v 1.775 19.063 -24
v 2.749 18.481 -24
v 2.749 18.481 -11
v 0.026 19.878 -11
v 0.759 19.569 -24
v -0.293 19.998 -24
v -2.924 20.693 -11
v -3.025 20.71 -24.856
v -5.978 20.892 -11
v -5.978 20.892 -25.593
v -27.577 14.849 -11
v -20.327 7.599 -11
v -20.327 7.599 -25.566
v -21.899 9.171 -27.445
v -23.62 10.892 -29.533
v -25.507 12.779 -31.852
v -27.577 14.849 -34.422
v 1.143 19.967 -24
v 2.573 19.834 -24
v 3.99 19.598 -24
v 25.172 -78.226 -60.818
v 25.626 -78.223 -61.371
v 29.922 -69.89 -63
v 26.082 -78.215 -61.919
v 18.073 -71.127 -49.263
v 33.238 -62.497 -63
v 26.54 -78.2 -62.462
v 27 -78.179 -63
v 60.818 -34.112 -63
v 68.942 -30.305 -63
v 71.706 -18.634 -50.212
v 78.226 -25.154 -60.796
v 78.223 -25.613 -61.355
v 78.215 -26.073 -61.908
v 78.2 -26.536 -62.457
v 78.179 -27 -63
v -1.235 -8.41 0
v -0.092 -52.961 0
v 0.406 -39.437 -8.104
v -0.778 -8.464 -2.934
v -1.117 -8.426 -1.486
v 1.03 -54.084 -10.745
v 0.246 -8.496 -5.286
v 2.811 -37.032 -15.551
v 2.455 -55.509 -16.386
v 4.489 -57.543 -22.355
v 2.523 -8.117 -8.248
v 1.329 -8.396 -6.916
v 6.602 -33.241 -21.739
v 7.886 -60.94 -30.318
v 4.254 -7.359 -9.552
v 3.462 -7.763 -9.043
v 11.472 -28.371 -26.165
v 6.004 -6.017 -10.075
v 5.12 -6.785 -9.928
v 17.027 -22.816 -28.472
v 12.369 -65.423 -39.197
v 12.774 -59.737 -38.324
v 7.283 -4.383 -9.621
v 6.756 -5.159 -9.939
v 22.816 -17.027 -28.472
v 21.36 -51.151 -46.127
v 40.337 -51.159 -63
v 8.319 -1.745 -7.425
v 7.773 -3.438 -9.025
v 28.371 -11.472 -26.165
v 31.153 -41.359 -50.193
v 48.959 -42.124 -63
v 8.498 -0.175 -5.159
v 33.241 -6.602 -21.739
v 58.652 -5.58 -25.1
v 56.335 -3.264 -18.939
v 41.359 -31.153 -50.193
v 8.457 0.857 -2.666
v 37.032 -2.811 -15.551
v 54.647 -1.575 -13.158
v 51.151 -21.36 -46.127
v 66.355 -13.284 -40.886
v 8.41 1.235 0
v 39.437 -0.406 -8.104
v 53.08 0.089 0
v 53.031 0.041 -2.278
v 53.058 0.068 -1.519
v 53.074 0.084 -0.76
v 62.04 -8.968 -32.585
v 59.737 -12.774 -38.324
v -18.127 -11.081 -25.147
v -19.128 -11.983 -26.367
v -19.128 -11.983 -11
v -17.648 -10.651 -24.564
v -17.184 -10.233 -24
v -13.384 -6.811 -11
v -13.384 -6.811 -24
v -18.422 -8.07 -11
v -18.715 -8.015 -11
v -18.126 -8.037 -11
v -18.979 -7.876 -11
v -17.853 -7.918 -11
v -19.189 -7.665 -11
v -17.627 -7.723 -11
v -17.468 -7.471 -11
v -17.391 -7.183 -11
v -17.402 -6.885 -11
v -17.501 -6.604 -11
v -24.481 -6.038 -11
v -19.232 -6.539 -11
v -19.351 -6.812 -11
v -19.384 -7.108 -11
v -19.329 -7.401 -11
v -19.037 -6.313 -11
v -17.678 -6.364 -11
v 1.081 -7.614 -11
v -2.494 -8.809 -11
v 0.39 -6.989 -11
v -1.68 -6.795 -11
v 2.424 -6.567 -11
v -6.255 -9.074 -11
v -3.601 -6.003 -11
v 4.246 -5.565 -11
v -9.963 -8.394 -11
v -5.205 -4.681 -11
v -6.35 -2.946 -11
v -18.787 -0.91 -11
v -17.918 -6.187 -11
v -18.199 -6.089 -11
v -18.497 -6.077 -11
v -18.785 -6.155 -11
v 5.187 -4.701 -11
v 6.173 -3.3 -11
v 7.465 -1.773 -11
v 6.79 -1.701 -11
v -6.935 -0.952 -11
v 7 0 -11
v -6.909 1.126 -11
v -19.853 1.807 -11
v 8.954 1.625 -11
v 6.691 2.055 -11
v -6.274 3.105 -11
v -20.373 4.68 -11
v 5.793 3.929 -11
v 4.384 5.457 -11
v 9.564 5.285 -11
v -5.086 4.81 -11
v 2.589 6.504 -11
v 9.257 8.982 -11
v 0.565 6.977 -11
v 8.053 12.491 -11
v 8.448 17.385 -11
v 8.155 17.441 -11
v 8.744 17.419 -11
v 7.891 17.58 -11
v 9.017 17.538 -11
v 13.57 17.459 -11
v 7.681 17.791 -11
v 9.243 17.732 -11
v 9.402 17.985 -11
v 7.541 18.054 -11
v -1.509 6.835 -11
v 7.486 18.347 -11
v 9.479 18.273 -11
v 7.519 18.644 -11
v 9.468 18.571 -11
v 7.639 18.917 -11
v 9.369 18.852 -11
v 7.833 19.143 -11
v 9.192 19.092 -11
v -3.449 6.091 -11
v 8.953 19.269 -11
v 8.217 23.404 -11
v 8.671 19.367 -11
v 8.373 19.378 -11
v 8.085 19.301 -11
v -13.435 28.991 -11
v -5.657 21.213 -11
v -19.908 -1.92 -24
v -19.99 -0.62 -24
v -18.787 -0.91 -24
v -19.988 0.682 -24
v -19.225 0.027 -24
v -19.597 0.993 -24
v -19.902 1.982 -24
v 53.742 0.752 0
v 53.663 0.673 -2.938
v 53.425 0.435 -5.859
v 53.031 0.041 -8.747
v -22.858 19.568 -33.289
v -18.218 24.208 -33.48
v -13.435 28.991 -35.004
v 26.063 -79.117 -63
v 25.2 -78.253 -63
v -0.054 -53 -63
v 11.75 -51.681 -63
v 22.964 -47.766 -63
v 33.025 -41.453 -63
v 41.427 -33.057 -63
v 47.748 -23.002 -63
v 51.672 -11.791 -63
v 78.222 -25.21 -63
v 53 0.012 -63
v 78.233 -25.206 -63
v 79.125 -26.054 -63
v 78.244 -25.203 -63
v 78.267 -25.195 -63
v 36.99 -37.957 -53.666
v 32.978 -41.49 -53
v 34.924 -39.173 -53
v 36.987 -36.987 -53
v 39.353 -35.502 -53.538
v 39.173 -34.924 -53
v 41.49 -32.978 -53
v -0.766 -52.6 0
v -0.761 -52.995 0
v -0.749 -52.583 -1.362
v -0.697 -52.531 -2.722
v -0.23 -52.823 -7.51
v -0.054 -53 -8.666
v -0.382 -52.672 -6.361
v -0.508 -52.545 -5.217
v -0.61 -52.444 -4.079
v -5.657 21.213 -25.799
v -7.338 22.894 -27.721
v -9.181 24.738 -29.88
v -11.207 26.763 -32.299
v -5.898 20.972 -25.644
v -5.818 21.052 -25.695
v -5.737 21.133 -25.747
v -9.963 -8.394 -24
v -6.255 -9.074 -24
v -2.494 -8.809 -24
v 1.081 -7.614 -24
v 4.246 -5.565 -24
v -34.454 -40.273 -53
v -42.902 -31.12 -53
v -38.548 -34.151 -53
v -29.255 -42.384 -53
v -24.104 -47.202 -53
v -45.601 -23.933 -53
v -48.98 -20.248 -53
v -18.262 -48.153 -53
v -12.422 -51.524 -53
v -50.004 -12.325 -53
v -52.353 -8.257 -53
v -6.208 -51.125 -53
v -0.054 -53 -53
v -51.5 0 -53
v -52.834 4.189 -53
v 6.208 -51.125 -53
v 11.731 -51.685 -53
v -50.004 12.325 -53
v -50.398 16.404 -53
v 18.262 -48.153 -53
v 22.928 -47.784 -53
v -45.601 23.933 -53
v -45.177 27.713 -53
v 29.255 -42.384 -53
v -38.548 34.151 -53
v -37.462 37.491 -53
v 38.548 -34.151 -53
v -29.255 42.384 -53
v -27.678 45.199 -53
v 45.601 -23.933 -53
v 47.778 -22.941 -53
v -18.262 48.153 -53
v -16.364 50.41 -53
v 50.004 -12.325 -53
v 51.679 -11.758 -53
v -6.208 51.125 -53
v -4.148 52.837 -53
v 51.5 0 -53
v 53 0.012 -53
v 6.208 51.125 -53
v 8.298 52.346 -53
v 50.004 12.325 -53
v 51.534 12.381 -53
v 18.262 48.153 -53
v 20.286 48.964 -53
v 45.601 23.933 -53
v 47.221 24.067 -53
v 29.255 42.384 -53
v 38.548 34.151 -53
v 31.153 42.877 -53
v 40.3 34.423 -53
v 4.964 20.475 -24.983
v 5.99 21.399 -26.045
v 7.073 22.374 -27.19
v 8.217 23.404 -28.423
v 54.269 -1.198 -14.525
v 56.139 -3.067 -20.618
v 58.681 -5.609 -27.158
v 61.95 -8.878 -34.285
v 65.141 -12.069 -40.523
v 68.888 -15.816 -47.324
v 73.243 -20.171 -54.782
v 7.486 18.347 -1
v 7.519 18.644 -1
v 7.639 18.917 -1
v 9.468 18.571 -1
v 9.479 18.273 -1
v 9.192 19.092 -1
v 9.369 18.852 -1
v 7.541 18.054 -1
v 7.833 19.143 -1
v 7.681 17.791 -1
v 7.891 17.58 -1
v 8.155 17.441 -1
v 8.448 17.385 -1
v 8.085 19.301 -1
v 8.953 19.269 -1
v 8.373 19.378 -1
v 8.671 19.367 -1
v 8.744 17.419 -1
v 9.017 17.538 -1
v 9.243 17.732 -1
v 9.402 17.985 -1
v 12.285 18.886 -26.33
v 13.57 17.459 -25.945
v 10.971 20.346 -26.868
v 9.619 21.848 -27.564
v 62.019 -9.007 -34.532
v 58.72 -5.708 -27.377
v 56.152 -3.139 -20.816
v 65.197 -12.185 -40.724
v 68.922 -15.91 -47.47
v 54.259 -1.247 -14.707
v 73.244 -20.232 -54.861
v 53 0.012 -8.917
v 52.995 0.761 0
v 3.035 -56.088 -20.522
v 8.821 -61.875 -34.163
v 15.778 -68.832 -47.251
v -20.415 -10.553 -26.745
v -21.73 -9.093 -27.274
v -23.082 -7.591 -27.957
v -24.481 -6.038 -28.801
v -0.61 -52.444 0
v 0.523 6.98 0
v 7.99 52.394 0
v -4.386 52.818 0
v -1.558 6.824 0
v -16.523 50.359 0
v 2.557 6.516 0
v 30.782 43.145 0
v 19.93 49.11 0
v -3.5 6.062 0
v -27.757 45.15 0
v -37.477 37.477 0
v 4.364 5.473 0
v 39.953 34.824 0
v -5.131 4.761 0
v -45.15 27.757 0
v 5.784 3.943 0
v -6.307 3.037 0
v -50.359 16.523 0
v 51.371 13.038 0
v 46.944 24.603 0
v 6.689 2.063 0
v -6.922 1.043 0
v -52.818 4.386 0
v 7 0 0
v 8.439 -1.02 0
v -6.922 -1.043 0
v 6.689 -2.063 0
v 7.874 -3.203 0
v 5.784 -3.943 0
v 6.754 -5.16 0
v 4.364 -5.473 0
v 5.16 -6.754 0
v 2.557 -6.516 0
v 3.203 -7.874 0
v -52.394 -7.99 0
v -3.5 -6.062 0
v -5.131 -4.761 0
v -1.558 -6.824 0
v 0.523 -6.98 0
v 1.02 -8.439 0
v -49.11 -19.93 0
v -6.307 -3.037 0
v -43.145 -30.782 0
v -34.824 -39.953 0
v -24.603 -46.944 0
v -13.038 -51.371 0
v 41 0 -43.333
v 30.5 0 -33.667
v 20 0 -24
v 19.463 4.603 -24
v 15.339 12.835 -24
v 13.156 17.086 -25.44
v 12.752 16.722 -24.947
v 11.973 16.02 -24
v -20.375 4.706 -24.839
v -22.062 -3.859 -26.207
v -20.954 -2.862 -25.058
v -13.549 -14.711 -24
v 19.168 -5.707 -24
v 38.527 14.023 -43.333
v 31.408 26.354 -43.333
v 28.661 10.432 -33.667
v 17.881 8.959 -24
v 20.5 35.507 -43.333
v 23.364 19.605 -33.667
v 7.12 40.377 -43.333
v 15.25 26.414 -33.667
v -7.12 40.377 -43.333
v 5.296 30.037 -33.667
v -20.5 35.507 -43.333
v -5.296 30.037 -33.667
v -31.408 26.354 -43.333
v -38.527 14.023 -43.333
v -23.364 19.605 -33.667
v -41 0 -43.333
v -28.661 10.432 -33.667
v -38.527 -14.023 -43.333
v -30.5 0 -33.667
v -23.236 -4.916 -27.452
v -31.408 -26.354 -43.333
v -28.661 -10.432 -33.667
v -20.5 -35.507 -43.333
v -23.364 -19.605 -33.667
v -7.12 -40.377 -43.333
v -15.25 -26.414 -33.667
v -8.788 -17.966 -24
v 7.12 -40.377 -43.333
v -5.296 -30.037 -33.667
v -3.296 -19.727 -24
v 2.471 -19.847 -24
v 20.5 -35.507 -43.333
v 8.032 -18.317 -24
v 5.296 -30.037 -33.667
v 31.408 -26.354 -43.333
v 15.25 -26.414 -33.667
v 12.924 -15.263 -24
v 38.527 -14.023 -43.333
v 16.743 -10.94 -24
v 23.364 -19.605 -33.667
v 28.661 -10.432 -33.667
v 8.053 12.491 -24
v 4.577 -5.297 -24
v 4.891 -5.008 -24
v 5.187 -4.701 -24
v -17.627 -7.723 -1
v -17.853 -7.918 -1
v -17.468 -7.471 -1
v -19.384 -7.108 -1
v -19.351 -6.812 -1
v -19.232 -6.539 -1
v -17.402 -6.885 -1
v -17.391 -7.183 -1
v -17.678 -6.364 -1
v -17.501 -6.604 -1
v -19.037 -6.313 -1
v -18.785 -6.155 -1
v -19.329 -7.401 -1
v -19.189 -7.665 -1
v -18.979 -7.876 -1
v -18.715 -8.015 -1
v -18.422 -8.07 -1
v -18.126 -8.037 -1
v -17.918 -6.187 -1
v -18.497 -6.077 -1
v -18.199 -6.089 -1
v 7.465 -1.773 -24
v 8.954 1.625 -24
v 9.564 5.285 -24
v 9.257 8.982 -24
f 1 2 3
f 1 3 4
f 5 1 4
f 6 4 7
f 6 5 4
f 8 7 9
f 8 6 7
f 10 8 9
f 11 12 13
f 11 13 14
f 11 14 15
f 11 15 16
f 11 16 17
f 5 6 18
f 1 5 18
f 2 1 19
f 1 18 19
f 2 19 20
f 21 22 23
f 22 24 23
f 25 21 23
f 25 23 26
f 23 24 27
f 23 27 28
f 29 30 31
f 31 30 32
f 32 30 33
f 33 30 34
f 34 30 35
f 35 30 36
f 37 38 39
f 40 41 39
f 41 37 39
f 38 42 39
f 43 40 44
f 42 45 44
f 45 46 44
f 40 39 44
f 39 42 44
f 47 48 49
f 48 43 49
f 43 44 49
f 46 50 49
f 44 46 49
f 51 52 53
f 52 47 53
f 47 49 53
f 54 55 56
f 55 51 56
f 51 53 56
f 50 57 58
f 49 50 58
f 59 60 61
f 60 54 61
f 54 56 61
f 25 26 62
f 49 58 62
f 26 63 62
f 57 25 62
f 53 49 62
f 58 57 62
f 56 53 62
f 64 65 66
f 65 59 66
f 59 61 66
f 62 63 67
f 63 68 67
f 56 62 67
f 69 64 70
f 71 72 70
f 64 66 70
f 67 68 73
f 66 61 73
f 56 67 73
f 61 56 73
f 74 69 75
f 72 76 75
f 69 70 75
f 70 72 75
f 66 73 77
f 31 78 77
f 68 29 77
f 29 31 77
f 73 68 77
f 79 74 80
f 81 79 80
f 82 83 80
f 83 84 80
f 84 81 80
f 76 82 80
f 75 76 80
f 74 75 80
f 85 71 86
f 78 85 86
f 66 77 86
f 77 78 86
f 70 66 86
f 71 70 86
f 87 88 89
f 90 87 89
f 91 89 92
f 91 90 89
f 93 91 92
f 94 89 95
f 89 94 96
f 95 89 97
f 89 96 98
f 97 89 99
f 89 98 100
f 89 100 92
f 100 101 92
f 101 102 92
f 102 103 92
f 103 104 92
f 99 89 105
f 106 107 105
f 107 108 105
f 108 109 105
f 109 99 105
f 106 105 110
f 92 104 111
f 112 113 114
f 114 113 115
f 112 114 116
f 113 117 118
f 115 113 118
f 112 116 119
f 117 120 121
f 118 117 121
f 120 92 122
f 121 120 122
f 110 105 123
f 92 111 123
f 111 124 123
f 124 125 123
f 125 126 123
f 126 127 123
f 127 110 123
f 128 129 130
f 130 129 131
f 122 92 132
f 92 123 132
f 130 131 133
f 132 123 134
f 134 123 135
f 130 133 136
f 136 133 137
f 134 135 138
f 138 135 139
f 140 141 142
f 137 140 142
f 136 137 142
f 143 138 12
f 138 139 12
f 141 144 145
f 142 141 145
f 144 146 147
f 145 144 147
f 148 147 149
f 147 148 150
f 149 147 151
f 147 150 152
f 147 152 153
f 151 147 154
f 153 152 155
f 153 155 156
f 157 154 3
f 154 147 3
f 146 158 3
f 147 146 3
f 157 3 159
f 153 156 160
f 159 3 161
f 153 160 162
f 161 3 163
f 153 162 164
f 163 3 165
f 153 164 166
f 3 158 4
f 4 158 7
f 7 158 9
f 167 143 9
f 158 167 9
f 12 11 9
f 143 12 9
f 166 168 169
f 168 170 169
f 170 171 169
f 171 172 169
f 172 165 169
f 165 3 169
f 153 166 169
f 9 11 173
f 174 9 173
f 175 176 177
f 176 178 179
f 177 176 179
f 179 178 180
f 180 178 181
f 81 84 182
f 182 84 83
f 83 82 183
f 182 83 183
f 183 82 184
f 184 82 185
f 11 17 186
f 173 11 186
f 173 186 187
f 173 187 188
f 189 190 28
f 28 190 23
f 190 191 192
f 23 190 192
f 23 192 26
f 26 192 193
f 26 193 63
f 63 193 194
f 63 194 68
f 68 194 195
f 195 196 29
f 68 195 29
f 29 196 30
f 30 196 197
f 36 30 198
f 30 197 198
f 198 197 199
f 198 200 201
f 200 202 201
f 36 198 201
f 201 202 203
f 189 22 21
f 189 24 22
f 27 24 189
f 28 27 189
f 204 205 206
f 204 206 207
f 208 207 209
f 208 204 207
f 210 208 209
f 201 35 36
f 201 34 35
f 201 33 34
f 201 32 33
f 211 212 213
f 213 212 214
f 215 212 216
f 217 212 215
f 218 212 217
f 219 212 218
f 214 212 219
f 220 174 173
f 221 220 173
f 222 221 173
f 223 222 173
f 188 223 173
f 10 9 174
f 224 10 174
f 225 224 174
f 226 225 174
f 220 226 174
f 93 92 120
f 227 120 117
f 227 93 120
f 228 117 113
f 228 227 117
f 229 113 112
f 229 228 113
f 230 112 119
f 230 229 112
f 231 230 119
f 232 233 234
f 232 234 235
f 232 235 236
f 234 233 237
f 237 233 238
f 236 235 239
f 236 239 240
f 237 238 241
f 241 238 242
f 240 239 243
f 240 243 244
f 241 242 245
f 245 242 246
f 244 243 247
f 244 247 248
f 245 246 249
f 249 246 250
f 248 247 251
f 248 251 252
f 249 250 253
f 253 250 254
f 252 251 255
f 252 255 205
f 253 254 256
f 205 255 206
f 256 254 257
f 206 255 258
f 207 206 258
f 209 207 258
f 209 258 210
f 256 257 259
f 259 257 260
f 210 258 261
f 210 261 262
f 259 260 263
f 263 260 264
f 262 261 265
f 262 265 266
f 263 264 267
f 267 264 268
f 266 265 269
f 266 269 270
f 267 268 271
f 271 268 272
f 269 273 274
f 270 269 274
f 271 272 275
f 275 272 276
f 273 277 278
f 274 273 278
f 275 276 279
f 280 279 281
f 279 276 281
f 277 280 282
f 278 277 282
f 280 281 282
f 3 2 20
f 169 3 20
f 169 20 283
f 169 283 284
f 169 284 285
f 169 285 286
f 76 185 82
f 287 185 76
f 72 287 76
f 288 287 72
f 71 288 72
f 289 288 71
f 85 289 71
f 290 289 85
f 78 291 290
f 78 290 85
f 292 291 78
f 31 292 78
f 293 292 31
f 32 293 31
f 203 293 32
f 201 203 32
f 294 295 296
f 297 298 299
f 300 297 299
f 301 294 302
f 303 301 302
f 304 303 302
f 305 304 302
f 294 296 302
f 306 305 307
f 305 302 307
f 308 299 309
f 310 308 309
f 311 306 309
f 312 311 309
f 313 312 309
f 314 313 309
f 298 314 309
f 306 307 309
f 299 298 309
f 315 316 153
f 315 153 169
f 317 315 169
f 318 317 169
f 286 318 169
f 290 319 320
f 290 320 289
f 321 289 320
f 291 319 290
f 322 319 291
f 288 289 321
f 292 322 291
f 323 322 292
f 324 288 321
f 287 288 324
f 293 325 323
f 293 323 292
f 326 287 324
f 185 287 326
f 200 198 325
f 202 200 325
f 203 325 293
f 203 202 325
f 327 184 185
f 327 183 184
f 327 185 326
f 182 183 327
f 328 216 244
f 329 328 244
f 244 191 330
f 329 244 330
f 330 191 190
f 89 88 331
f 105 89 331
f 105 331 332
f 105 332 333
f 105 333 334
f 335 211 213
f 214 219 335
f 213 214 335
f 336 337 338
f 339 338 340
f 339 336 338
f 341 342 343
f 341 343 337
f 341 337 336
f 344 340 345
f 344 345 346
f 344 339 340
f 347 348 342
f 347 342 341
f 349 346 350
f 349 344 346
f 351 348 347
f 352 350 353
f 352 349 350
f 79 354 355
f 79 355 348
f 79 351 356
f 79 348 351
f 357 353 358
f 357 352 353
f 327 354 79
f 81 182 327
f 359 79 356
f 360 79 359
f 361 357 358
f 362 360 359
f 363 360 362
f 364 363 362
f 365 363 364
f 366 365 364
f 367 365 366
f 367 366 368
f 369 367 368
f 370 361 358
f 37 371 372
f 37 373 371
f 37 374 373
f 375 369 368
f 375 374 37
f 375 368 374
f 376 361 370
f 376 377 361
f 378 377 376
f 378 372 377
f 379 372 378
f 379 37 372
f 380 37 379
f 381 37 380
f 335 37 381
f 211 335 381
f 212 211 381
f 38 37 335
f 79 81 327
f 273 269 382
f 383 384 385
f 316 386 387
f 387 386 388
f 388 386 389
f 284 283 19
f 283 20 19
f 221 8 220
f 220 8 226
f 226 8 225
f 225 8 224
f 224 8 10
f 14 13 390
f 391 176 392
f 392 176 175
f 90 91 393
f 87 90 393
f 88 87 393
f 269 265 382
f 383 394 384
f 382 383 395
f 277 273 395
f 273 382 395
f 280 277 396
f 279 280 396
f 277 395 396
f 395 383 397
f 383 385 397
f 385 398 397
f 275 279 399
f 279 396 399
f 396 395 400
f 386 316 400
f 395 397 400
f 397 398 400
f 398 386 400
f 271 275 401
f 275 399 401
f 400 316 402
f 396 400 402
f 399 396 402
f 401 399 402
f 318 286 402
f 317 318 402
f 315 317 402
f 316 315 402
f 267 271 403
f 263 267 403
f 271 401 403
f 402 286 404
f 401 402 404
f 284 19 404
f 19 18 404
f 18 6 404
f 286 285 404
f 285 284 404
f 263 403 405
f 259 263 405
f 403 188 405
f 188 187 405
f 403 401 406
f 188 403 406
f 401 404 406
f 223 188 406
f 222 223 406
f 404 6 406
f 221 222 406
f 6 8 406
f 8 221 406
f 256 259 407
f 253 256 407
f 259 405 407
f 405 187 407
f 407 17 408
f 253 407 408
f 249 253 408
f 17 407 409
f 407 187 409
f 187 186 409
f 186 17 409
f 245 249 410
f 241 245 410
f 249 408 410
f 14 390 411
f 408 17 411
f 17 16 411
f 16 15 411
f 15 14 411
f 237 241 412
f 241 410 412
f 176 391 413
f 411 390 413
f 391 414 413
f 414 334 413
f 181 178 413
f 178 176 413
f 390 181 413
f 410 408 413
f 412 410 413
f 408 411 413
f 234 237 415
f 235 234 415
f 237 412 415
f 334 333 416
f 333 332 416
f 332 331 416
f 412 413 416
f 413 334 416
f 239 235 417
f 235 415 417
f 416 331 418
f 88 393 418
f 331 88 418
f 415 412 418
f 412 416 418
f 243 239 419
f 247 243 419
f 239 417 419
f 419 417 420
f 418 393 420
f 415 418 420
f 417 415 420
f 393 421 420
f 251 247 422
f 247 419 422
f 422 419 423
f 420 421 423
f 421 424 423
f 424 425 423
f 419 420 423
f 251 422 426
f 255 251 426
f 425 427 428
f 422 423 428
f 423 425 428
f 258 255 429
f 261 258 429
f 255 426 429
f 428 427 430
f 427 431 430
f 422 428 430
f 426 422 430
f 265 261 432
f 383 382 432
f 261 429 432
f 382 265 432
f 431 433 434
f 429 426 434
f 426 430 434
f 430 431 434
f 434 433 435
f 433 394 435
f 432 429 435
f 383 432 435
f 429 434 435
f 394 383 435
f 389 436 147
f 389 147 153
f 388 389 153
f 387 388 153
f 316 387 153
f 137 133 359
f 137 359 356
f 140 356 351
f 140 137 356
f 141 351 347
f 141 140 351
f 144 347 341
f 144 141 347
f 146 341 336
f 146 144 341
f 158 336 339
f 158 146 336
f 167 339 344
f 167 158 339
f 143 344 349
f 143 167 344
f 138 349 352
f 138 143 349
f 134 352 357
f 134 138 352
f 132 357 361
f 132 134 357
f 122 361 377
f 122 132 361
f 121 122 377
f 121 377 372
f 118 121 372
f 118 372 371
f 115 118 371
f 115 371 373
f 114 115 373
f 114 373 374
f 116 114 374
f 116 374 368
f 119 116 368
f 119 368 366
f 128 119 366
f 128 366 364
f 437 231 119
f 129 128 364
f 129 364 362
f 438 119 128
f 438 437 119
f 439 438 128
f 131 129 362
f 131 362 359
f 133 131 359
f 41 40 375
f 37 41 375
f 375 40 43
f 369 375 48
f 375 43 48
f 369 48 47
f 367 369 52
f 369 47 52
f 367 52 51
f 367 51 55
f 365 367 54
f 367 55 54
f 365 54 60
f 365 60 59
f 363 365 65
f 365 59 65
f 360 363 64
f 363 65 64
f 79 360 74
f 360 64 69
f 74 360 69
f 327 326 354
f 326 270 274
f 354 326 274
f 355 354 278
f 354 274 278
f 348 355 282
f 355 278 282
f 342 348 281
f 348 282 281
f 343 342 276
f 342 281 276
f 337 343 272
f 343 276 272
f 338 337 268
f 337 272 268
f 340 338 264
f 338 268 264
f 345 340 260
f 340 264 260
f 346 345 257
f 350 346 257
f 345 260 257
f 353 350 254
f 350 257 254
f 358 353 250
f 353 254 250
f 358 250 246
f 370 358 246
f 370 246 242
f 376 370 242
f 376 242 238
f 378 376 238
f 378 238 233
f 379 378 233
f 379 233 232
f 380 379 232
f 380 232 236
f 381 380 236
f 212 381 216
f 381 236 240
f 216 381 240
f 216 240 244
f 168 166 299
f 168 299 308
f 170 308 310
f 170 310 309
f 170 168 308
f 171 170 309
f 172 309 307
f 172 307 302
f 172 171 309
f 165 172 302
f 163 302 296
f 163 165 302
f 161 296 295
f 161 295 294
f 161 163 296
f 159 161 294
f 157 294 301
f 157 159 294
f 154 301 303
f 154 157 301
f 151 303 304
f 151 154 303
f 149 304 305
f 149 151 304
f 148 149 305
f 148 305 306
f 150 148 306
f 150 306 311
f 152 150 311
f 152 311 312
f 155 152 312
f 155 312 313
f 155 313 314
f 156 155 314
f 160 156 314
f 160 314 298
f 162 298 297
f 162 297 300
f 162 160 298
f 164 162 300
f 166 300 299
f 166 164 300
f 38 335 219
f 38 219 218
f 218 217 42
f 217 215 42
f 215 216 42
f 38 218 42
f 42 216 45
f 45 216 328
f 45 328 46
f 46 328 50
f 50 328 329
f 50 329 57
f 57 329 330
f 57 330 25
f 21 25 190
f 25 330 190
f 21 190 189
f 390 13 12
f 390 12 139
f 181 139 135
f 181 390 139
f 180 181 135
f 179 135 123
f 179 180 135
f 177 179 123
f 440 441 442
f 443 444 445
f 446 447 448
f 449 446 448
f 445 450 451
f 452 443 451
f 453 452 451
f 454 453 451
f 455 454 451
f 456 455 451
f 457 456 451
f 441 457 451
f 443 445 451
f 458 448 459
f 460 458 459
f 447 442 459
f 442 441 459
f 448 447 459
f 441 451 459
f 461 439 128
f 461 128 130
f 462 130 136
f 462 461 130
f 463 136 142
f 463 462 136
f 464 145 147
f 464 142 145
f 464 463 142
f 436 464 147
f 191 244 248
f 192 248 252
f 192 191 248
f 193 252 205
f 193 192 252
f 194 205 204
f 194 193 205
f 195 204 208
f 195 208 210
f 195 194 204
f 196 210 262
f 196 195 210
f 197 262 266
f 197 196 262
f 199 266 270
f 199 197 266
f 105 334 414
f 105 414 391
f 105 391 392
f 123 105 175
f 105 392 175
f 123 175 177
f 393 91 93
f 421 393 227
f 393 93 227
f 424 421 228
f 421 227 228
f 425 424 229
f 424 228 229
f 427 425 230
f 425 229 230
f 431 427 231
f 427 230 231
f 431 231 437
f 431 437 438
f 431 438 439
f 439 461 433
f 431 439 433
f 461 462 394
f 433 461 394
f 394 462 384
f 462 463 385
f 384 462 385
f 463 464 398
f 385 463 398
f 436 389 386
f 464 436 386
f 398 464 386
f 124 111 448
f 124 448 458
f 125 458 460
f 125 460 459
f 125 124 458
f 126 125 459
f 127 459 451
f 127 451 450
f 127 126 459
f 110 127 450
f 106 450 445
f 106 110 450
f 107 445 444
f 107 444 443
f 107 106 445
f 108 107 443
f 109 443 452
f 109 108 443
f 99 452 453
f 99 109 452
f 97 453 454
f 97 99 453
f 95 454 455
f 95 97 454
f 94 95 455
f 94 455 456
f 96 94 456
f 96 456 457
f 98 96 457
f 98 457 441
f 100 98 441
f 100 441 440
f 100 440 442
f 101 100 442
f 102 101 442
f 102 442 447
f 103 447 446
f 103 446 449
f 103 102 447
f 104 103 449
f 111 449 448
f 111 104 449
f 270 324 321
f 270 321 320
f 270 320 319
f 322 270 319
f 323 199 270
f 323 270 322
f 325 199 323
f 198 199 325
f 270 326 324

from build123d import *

# Parameters (mm, degrees)
CYLINDER009_R               = 15
CYLINDER009_DEPTH           = 80
CYLINDER009_PLACEMENT_ANGLE = 39
BOX010_W                    = 44
BOX010_H                    = 8
BOX010_DEPTH                = 80
BOX010_PLACEMENT_ANGLE      = 42
CYLINDER010_R               = 1
CYLINDER010_DEPTH           = 10
CYLINDER010_PLACEMENT_ANGLE = 45
CYLINDER011_R               = 1
CYLINDER011_DEPTH           = 10
CYLINDER011_PLACEMENT_ANGLE = 45
BOX011_W                    = 20
BOX011_H                    = 11
BOX011_DEPTH                = 80
BOX011_PLACEMENT_ANGLE      = 45
CYLINDER007_R               = 8.5
CYLINDER007_DEPTH           = 45
BOX005_W                    = 100
BOX005_H                    = 200
BOX005_DEPTH                = 50
BOX005_PITCH_ANGLE          = 60
BOX005_PLACEMENT_ANGLE      = -45
BOX016_W                    = 100
BOX016_H                    = 100
BOX016_DEPTH                = 100
BOX016_PLACEMENT_ANGLE      = 45
BOX017_W                    = 100
BOX017_H                    = 100
BOX017_DEPTH                = 100
BOX017_PLACEMENT_ANGLE      = 45
BOX018_W                    = 200
BOX018_H                    = 200
BOX018_DEPTH                = 200
CONE003_ANGLE               = 180
CONE003_ROLL_ANGLE          = -90
CONE003_PLACEMENT_ANGLE     = -135
CONE002_ANGLE               = 180
CONE002_ROLL_ANGLE          = -90
CONE002_PLACEMENT_ANGLE     = -135
CYLINDER018_R               = 53
CYLINDER018_DEPTH           = 60
BOX019_W                    = 38
BOX019_H                    = 75
BOX019_DEPTH                = 63
BOX019_PLACEMENT_ANGLE      = 45
CYLINDER006_R               = 53
CYLINDER006_DEPTH           = 53
TUBE009_R                   = 8.5
TUBE009_R_2                 = 7
TUBE009_DEPTH               = 53


with BuildPart() as cylinder009:
    # Cylinder009 → Cylinder009 (new body)
    with BuildSketch(Plane.XY):
        Circle(CYLINDER009_R)
    extrude(amount=CYLINDER009_DEPTH)


with BuildPart() as cylinder009_1:
    # Cylinder009 placement: moved
    add(cylinder009.part.moved(Location((-5.423136, 5.902507, -91))).rotate(Axis((-5.423136, 5.902507, -91), (0, 0, 1)), CYLINDER009_PLACEMENT_ANGLE))


with BuildPart() as cube010:
    # Box010 → Box010 (new body)
    with BuildSketch(Plane.XY):
        with Locations((22, 4)):
            Rectangle(BOX010_W, BOX010_H)
    extrude(amount=BOX010_DEPTH)


with BuildPart() as cube010_1:
    # Box010 placement: moved
    add(cube010.part.moved(Location((-19.127921, -11.982839, -91))).rotate(Axis((-19.127921, -11.982839, -91), (0, 0, 1)), BOX010_PLACEMENT_ANGLE))


with BuildPart() as cone004:
    # Cone004 → Cone004 (revolve)
    with BuildSketch(Plane(origin=(0, 0, -53), x_dir=(1, 0, 0), z_dir=(0, -1, 0))):
        Polygon((0, 0), (51.5, 0), (20, 29), (0, 29), align=None)
    revolve(axis=Axis((0, 0, -53), (0, 0, 1)))


with BuildPart() as cylinder010:
    # Cylinder010 → Cylinder010 (new body)
    with BuildSketch(Plane.XY):
        Circle(CYLINDER010_R)
    extrude(amount=CYLINDER010_DEPTH)


with BuildPart() as cylinder010_1:
    # Cylinder010 placement: moved
    add(cylinder010.part.moved(Location((-18.384776, -7.071068, -11))).rotate(Axis((-18.384776, -7.071068, -11), (0, 0, 1)), CYLINDER010_PLACEMENT_ANGLE))


with BuildPart() as cylinder011:
    # Cylinder011 → Cylinder011 (new body)
    with BuildSketch(Plane.XY):
        Circle(CYLINDER011_R)
    extrude(amount=CYLINDER011_DEPTH)


with BuildPart() as cylinder011_1:
    # Cylinder011 placement: moved
    add(cylinder011.part.moved(Location((8.485281, 18.384776, -11))).rotate(Axis((8.485281, 18.384776, -11), (0, 0, 1)), CYLINDER011_PLACEMENT_ANGLE))


with BuildPart() as fusion010:
    # Box011 → Box011 (new body)
    with BuildSketch(Plane.XY):
        with Locations((10, 5.5)):
            Rectangle(BOX011_W, BOX011_H)
    extrude(amount=BOX011_DEPTH)


with BuildPart() as fusion010_1:
    # Box011 placement: moved
    add(fusion010.part.moved(Location((-19.79899, 7.071068, -91))).rotate(Axis((-19.79899, 7.071068, -91), (0, 0, 1)), BOX011_PLACEMENT_ANGLE))

    # Fusion010: union Cylinder009, Cube010, Cone004, Cylinder010, Cylinder011
    add(cylinder009_1.part)
    add(cube010_1.part)
    add(cone004.part)
    add(cylinder010_1.part)
    add(cylinder011_1.part)


with BuildPart() as cylinder007:
    # Cylinder007 → Cylinder007 (new body)
    with BuildSketch(Plane.XY.offset(-43)):
        Circle(CYLINDER007_R)
    extrude(amount=CYLINDER007_DEPTH)


with BuildPart() as cube005:
    # Box005 → Box005 (new body)
    with BuildSketch(Plane.XY):
        with Locations((50, 100)):
            Rectangle(BOX005_W, BOX005_H)
    extrude(amount=BOX005_DEPTH)


with BuildPart() as cube005_1:
    # Box005 pitch: moved
    add(cube005.part.rotate(Axis((0, 0, 0), (0, 1, 0)), BOX005_PITCH_ANGLE))


with BuildPart() as cube005_2:
    # Box005 placement: moved
    add(cube005_1.part.moved(Location((-38.183766, -91.923882, 0))).rotate(Axis((-38.183766, -91.923882, 0), (0, 0, 1)), BOX005_PLACEMENT_ANGLE))


with BuildPart() as cube016:
    # Box016 → Box016 (new body)
    with BuildSketch(Plane.XY):
        with Locations((50, 50)):
            Rectangle(BOX016_W, BOX016_H)
    extrude(amount=BOX016_DEPTH)


with BuildPart() as cube016_1:
    # Box016 placement: moved
    add(cube016.part.moved(Location((-71.320657, -123.15444, -92))).rotate(Axis((-71.320657, -123.15444, -92), (0, 0, -1)), BOX016_PLACEMENT_ANGLE))


with BuildPart() as cube017:
    # Box017 → Box017 (new body)
    with BuildSketch(Plane.XY):
        with Locations((50, 50)):
            Rectangle(BOX017_W, BOX017_H)
    extrude(amount=BOX017_DEPTH)


with BuildPart() as cube017_1:
    # Box017 placement: moved
    add(cube017.part.moved(Location((53.030932, 0.040624, -92))).rotate(Axis((53.030932, 0.040624, -92), (0, 0, -1)), BOX017_PLACEMENT_ANGLE))


with BuildPart() as cube018:
    # Box018 → Box018 (new body)
    with BuildSketch(Plane(origin=(-111, -128, -263), x_dir=(1, 0, 0), z_dir=(0, 0, 1))):
        with Locations((100, 100)):
            Rectangle(BOX018_W, BOX018_H)
    extrude(amount=BOX018_DEPTH)


with BuildPart() as fusion009004:
    # Cone003 → Cone003 (revolve)
    with BuildSketch(Plane.XZ):
        Polygon((0, 0), (2, 0), (78, 80), (0, 80), align=None)
    revolve(axis=Axis((0, 0, 0), (0, 0, 1)), revolution_arc=CONE003_ANGLE)


with BuildPart() as fusion009004_1:
    # Cone003 roll: moved
    add(fusion009004.part.rotate(Axis((0, 0, 0), (1, 0, 0)), CONE003_ROLL_ANGLE))


with BuildPart() as fusion009004_2:
    # Cone003 placement: moved
    add(fusion009004_1.part.rotate(Axis((0, 0, 0), (0, 0, 1)), CONE003_PLACEMENT_ANGLE))

    # Fusion009004: union Cube016, Cube017, Cube018
    add(cube016_1.part)
    add(cube017_1.part)
    add(cube018.part)


with BuildPart() as cone002_vonkajsi:
    # Cone002 → Cone002 (revolve)
    with BuildSketch(Plane.XZ):
        Polygon((0, 0), (2, 0), (80, 80), (0, 80), align=None)
    revolve(axis=Axis((0, 0, 0), (0, 0, 1)), revolution_arc=CONE002_ANGLE)


with BuildPart() as cone002_vonkajsi_1:
    # Cone002 roll: moved
    add(cone002_vonkajsi.part.rotate(Axis((0, 0, 0), (1, 0, 0)), CONE002_ROLL_ANGLE))


with BuildPart() as cone002_vonkajsi_2:
    # Cone002 placement: moved
    add(cone002_vonkajsi_1.part.rotate(Axis((0, 0, 0), (0, 0, 1)), CONE002_PLACEMENT_ANGLE))


with BuildPart() as cut007:
    # Cut004 base: copy of Cone002_vonkajsi
    add(cone002_vonkajsi_2.part)

    # Cut004: cut Fusion009004
    add(fusion009004_2.part, mode=Mode.SUBTRACT)

    # Cut007: cut Cube005
    add(cube005_2.part, mode=Mode.SUBTRACT)


with BuildPart() as cylinder018:
    # Cylinder018 → Cylinder018 (new body)
    with BuildSketch(Plane.XY.offset(-63)):
        Circle(CYLINDER018_R)
    extrude(amount=CYLINDER018_DEPTH)


with BuildPart() as cut009005:
    # Box019 → Box019 (new body)
    with BuildSketch(Plane.XY):
        with Locations((19, 37.5)):
            Rectangle(BOX019_W, BOX019_H)
    extrude(amount=BOX019_DEPTH)


with BuildPart() as cut009005_1:
    # Box019 placement: moved
    add(cut009005.part.moved(Location((-0.609979, -52.443762, -63))).rotate(Axis((-0.609979, -52.443762, -63), (0, 0, -1)), BOX019_PLACEMENT_ANGLE))

    # Cut009005: cut Cylinder018
    add(cylinder018.part, mode=Mode.SUBTRACT)


with BuildPart() as cut006:
    # Cylinder006 → Cylinder006 (new body)
    with BuildSketch(Plane.XY.offset(-53)):
        Circle(CYLINDER006_R)
    extrude(amount=CYLINDER006_DEPTH)

    # Fusion009005: union Cut009005
    add(cut009005_1.part)

    # Cut005: cut Cone002_vonkajsi
    add(cone002_vonkajsi_2.part, mode=Mode.SUBTRACT)

    # Fusion005: union Cut007
    add(cut007.part)

    # Cut006: cut Cylinder007
    add(cylinder007.part, mode=Mode.SUBTRACT)


with BuildPart() as cut009_middle:
    # Tube009 → Tube009 (new body)
    with BuildSketch(Plane.XY.offset(-53)):
        Circle(TUBE009_R)
        Circle(TUBE009_R_2, mode=Mode.SUBTRACT)
    extrude(amount=TUBE009_DEPTH)

    # Fusion006: union Cut006
    add(cut006.part)

    # Cut009: cut Fusion010
    add(fusion010_1.part, mode=Mode.SUBTRACT)


solid = cut009_middle.part
